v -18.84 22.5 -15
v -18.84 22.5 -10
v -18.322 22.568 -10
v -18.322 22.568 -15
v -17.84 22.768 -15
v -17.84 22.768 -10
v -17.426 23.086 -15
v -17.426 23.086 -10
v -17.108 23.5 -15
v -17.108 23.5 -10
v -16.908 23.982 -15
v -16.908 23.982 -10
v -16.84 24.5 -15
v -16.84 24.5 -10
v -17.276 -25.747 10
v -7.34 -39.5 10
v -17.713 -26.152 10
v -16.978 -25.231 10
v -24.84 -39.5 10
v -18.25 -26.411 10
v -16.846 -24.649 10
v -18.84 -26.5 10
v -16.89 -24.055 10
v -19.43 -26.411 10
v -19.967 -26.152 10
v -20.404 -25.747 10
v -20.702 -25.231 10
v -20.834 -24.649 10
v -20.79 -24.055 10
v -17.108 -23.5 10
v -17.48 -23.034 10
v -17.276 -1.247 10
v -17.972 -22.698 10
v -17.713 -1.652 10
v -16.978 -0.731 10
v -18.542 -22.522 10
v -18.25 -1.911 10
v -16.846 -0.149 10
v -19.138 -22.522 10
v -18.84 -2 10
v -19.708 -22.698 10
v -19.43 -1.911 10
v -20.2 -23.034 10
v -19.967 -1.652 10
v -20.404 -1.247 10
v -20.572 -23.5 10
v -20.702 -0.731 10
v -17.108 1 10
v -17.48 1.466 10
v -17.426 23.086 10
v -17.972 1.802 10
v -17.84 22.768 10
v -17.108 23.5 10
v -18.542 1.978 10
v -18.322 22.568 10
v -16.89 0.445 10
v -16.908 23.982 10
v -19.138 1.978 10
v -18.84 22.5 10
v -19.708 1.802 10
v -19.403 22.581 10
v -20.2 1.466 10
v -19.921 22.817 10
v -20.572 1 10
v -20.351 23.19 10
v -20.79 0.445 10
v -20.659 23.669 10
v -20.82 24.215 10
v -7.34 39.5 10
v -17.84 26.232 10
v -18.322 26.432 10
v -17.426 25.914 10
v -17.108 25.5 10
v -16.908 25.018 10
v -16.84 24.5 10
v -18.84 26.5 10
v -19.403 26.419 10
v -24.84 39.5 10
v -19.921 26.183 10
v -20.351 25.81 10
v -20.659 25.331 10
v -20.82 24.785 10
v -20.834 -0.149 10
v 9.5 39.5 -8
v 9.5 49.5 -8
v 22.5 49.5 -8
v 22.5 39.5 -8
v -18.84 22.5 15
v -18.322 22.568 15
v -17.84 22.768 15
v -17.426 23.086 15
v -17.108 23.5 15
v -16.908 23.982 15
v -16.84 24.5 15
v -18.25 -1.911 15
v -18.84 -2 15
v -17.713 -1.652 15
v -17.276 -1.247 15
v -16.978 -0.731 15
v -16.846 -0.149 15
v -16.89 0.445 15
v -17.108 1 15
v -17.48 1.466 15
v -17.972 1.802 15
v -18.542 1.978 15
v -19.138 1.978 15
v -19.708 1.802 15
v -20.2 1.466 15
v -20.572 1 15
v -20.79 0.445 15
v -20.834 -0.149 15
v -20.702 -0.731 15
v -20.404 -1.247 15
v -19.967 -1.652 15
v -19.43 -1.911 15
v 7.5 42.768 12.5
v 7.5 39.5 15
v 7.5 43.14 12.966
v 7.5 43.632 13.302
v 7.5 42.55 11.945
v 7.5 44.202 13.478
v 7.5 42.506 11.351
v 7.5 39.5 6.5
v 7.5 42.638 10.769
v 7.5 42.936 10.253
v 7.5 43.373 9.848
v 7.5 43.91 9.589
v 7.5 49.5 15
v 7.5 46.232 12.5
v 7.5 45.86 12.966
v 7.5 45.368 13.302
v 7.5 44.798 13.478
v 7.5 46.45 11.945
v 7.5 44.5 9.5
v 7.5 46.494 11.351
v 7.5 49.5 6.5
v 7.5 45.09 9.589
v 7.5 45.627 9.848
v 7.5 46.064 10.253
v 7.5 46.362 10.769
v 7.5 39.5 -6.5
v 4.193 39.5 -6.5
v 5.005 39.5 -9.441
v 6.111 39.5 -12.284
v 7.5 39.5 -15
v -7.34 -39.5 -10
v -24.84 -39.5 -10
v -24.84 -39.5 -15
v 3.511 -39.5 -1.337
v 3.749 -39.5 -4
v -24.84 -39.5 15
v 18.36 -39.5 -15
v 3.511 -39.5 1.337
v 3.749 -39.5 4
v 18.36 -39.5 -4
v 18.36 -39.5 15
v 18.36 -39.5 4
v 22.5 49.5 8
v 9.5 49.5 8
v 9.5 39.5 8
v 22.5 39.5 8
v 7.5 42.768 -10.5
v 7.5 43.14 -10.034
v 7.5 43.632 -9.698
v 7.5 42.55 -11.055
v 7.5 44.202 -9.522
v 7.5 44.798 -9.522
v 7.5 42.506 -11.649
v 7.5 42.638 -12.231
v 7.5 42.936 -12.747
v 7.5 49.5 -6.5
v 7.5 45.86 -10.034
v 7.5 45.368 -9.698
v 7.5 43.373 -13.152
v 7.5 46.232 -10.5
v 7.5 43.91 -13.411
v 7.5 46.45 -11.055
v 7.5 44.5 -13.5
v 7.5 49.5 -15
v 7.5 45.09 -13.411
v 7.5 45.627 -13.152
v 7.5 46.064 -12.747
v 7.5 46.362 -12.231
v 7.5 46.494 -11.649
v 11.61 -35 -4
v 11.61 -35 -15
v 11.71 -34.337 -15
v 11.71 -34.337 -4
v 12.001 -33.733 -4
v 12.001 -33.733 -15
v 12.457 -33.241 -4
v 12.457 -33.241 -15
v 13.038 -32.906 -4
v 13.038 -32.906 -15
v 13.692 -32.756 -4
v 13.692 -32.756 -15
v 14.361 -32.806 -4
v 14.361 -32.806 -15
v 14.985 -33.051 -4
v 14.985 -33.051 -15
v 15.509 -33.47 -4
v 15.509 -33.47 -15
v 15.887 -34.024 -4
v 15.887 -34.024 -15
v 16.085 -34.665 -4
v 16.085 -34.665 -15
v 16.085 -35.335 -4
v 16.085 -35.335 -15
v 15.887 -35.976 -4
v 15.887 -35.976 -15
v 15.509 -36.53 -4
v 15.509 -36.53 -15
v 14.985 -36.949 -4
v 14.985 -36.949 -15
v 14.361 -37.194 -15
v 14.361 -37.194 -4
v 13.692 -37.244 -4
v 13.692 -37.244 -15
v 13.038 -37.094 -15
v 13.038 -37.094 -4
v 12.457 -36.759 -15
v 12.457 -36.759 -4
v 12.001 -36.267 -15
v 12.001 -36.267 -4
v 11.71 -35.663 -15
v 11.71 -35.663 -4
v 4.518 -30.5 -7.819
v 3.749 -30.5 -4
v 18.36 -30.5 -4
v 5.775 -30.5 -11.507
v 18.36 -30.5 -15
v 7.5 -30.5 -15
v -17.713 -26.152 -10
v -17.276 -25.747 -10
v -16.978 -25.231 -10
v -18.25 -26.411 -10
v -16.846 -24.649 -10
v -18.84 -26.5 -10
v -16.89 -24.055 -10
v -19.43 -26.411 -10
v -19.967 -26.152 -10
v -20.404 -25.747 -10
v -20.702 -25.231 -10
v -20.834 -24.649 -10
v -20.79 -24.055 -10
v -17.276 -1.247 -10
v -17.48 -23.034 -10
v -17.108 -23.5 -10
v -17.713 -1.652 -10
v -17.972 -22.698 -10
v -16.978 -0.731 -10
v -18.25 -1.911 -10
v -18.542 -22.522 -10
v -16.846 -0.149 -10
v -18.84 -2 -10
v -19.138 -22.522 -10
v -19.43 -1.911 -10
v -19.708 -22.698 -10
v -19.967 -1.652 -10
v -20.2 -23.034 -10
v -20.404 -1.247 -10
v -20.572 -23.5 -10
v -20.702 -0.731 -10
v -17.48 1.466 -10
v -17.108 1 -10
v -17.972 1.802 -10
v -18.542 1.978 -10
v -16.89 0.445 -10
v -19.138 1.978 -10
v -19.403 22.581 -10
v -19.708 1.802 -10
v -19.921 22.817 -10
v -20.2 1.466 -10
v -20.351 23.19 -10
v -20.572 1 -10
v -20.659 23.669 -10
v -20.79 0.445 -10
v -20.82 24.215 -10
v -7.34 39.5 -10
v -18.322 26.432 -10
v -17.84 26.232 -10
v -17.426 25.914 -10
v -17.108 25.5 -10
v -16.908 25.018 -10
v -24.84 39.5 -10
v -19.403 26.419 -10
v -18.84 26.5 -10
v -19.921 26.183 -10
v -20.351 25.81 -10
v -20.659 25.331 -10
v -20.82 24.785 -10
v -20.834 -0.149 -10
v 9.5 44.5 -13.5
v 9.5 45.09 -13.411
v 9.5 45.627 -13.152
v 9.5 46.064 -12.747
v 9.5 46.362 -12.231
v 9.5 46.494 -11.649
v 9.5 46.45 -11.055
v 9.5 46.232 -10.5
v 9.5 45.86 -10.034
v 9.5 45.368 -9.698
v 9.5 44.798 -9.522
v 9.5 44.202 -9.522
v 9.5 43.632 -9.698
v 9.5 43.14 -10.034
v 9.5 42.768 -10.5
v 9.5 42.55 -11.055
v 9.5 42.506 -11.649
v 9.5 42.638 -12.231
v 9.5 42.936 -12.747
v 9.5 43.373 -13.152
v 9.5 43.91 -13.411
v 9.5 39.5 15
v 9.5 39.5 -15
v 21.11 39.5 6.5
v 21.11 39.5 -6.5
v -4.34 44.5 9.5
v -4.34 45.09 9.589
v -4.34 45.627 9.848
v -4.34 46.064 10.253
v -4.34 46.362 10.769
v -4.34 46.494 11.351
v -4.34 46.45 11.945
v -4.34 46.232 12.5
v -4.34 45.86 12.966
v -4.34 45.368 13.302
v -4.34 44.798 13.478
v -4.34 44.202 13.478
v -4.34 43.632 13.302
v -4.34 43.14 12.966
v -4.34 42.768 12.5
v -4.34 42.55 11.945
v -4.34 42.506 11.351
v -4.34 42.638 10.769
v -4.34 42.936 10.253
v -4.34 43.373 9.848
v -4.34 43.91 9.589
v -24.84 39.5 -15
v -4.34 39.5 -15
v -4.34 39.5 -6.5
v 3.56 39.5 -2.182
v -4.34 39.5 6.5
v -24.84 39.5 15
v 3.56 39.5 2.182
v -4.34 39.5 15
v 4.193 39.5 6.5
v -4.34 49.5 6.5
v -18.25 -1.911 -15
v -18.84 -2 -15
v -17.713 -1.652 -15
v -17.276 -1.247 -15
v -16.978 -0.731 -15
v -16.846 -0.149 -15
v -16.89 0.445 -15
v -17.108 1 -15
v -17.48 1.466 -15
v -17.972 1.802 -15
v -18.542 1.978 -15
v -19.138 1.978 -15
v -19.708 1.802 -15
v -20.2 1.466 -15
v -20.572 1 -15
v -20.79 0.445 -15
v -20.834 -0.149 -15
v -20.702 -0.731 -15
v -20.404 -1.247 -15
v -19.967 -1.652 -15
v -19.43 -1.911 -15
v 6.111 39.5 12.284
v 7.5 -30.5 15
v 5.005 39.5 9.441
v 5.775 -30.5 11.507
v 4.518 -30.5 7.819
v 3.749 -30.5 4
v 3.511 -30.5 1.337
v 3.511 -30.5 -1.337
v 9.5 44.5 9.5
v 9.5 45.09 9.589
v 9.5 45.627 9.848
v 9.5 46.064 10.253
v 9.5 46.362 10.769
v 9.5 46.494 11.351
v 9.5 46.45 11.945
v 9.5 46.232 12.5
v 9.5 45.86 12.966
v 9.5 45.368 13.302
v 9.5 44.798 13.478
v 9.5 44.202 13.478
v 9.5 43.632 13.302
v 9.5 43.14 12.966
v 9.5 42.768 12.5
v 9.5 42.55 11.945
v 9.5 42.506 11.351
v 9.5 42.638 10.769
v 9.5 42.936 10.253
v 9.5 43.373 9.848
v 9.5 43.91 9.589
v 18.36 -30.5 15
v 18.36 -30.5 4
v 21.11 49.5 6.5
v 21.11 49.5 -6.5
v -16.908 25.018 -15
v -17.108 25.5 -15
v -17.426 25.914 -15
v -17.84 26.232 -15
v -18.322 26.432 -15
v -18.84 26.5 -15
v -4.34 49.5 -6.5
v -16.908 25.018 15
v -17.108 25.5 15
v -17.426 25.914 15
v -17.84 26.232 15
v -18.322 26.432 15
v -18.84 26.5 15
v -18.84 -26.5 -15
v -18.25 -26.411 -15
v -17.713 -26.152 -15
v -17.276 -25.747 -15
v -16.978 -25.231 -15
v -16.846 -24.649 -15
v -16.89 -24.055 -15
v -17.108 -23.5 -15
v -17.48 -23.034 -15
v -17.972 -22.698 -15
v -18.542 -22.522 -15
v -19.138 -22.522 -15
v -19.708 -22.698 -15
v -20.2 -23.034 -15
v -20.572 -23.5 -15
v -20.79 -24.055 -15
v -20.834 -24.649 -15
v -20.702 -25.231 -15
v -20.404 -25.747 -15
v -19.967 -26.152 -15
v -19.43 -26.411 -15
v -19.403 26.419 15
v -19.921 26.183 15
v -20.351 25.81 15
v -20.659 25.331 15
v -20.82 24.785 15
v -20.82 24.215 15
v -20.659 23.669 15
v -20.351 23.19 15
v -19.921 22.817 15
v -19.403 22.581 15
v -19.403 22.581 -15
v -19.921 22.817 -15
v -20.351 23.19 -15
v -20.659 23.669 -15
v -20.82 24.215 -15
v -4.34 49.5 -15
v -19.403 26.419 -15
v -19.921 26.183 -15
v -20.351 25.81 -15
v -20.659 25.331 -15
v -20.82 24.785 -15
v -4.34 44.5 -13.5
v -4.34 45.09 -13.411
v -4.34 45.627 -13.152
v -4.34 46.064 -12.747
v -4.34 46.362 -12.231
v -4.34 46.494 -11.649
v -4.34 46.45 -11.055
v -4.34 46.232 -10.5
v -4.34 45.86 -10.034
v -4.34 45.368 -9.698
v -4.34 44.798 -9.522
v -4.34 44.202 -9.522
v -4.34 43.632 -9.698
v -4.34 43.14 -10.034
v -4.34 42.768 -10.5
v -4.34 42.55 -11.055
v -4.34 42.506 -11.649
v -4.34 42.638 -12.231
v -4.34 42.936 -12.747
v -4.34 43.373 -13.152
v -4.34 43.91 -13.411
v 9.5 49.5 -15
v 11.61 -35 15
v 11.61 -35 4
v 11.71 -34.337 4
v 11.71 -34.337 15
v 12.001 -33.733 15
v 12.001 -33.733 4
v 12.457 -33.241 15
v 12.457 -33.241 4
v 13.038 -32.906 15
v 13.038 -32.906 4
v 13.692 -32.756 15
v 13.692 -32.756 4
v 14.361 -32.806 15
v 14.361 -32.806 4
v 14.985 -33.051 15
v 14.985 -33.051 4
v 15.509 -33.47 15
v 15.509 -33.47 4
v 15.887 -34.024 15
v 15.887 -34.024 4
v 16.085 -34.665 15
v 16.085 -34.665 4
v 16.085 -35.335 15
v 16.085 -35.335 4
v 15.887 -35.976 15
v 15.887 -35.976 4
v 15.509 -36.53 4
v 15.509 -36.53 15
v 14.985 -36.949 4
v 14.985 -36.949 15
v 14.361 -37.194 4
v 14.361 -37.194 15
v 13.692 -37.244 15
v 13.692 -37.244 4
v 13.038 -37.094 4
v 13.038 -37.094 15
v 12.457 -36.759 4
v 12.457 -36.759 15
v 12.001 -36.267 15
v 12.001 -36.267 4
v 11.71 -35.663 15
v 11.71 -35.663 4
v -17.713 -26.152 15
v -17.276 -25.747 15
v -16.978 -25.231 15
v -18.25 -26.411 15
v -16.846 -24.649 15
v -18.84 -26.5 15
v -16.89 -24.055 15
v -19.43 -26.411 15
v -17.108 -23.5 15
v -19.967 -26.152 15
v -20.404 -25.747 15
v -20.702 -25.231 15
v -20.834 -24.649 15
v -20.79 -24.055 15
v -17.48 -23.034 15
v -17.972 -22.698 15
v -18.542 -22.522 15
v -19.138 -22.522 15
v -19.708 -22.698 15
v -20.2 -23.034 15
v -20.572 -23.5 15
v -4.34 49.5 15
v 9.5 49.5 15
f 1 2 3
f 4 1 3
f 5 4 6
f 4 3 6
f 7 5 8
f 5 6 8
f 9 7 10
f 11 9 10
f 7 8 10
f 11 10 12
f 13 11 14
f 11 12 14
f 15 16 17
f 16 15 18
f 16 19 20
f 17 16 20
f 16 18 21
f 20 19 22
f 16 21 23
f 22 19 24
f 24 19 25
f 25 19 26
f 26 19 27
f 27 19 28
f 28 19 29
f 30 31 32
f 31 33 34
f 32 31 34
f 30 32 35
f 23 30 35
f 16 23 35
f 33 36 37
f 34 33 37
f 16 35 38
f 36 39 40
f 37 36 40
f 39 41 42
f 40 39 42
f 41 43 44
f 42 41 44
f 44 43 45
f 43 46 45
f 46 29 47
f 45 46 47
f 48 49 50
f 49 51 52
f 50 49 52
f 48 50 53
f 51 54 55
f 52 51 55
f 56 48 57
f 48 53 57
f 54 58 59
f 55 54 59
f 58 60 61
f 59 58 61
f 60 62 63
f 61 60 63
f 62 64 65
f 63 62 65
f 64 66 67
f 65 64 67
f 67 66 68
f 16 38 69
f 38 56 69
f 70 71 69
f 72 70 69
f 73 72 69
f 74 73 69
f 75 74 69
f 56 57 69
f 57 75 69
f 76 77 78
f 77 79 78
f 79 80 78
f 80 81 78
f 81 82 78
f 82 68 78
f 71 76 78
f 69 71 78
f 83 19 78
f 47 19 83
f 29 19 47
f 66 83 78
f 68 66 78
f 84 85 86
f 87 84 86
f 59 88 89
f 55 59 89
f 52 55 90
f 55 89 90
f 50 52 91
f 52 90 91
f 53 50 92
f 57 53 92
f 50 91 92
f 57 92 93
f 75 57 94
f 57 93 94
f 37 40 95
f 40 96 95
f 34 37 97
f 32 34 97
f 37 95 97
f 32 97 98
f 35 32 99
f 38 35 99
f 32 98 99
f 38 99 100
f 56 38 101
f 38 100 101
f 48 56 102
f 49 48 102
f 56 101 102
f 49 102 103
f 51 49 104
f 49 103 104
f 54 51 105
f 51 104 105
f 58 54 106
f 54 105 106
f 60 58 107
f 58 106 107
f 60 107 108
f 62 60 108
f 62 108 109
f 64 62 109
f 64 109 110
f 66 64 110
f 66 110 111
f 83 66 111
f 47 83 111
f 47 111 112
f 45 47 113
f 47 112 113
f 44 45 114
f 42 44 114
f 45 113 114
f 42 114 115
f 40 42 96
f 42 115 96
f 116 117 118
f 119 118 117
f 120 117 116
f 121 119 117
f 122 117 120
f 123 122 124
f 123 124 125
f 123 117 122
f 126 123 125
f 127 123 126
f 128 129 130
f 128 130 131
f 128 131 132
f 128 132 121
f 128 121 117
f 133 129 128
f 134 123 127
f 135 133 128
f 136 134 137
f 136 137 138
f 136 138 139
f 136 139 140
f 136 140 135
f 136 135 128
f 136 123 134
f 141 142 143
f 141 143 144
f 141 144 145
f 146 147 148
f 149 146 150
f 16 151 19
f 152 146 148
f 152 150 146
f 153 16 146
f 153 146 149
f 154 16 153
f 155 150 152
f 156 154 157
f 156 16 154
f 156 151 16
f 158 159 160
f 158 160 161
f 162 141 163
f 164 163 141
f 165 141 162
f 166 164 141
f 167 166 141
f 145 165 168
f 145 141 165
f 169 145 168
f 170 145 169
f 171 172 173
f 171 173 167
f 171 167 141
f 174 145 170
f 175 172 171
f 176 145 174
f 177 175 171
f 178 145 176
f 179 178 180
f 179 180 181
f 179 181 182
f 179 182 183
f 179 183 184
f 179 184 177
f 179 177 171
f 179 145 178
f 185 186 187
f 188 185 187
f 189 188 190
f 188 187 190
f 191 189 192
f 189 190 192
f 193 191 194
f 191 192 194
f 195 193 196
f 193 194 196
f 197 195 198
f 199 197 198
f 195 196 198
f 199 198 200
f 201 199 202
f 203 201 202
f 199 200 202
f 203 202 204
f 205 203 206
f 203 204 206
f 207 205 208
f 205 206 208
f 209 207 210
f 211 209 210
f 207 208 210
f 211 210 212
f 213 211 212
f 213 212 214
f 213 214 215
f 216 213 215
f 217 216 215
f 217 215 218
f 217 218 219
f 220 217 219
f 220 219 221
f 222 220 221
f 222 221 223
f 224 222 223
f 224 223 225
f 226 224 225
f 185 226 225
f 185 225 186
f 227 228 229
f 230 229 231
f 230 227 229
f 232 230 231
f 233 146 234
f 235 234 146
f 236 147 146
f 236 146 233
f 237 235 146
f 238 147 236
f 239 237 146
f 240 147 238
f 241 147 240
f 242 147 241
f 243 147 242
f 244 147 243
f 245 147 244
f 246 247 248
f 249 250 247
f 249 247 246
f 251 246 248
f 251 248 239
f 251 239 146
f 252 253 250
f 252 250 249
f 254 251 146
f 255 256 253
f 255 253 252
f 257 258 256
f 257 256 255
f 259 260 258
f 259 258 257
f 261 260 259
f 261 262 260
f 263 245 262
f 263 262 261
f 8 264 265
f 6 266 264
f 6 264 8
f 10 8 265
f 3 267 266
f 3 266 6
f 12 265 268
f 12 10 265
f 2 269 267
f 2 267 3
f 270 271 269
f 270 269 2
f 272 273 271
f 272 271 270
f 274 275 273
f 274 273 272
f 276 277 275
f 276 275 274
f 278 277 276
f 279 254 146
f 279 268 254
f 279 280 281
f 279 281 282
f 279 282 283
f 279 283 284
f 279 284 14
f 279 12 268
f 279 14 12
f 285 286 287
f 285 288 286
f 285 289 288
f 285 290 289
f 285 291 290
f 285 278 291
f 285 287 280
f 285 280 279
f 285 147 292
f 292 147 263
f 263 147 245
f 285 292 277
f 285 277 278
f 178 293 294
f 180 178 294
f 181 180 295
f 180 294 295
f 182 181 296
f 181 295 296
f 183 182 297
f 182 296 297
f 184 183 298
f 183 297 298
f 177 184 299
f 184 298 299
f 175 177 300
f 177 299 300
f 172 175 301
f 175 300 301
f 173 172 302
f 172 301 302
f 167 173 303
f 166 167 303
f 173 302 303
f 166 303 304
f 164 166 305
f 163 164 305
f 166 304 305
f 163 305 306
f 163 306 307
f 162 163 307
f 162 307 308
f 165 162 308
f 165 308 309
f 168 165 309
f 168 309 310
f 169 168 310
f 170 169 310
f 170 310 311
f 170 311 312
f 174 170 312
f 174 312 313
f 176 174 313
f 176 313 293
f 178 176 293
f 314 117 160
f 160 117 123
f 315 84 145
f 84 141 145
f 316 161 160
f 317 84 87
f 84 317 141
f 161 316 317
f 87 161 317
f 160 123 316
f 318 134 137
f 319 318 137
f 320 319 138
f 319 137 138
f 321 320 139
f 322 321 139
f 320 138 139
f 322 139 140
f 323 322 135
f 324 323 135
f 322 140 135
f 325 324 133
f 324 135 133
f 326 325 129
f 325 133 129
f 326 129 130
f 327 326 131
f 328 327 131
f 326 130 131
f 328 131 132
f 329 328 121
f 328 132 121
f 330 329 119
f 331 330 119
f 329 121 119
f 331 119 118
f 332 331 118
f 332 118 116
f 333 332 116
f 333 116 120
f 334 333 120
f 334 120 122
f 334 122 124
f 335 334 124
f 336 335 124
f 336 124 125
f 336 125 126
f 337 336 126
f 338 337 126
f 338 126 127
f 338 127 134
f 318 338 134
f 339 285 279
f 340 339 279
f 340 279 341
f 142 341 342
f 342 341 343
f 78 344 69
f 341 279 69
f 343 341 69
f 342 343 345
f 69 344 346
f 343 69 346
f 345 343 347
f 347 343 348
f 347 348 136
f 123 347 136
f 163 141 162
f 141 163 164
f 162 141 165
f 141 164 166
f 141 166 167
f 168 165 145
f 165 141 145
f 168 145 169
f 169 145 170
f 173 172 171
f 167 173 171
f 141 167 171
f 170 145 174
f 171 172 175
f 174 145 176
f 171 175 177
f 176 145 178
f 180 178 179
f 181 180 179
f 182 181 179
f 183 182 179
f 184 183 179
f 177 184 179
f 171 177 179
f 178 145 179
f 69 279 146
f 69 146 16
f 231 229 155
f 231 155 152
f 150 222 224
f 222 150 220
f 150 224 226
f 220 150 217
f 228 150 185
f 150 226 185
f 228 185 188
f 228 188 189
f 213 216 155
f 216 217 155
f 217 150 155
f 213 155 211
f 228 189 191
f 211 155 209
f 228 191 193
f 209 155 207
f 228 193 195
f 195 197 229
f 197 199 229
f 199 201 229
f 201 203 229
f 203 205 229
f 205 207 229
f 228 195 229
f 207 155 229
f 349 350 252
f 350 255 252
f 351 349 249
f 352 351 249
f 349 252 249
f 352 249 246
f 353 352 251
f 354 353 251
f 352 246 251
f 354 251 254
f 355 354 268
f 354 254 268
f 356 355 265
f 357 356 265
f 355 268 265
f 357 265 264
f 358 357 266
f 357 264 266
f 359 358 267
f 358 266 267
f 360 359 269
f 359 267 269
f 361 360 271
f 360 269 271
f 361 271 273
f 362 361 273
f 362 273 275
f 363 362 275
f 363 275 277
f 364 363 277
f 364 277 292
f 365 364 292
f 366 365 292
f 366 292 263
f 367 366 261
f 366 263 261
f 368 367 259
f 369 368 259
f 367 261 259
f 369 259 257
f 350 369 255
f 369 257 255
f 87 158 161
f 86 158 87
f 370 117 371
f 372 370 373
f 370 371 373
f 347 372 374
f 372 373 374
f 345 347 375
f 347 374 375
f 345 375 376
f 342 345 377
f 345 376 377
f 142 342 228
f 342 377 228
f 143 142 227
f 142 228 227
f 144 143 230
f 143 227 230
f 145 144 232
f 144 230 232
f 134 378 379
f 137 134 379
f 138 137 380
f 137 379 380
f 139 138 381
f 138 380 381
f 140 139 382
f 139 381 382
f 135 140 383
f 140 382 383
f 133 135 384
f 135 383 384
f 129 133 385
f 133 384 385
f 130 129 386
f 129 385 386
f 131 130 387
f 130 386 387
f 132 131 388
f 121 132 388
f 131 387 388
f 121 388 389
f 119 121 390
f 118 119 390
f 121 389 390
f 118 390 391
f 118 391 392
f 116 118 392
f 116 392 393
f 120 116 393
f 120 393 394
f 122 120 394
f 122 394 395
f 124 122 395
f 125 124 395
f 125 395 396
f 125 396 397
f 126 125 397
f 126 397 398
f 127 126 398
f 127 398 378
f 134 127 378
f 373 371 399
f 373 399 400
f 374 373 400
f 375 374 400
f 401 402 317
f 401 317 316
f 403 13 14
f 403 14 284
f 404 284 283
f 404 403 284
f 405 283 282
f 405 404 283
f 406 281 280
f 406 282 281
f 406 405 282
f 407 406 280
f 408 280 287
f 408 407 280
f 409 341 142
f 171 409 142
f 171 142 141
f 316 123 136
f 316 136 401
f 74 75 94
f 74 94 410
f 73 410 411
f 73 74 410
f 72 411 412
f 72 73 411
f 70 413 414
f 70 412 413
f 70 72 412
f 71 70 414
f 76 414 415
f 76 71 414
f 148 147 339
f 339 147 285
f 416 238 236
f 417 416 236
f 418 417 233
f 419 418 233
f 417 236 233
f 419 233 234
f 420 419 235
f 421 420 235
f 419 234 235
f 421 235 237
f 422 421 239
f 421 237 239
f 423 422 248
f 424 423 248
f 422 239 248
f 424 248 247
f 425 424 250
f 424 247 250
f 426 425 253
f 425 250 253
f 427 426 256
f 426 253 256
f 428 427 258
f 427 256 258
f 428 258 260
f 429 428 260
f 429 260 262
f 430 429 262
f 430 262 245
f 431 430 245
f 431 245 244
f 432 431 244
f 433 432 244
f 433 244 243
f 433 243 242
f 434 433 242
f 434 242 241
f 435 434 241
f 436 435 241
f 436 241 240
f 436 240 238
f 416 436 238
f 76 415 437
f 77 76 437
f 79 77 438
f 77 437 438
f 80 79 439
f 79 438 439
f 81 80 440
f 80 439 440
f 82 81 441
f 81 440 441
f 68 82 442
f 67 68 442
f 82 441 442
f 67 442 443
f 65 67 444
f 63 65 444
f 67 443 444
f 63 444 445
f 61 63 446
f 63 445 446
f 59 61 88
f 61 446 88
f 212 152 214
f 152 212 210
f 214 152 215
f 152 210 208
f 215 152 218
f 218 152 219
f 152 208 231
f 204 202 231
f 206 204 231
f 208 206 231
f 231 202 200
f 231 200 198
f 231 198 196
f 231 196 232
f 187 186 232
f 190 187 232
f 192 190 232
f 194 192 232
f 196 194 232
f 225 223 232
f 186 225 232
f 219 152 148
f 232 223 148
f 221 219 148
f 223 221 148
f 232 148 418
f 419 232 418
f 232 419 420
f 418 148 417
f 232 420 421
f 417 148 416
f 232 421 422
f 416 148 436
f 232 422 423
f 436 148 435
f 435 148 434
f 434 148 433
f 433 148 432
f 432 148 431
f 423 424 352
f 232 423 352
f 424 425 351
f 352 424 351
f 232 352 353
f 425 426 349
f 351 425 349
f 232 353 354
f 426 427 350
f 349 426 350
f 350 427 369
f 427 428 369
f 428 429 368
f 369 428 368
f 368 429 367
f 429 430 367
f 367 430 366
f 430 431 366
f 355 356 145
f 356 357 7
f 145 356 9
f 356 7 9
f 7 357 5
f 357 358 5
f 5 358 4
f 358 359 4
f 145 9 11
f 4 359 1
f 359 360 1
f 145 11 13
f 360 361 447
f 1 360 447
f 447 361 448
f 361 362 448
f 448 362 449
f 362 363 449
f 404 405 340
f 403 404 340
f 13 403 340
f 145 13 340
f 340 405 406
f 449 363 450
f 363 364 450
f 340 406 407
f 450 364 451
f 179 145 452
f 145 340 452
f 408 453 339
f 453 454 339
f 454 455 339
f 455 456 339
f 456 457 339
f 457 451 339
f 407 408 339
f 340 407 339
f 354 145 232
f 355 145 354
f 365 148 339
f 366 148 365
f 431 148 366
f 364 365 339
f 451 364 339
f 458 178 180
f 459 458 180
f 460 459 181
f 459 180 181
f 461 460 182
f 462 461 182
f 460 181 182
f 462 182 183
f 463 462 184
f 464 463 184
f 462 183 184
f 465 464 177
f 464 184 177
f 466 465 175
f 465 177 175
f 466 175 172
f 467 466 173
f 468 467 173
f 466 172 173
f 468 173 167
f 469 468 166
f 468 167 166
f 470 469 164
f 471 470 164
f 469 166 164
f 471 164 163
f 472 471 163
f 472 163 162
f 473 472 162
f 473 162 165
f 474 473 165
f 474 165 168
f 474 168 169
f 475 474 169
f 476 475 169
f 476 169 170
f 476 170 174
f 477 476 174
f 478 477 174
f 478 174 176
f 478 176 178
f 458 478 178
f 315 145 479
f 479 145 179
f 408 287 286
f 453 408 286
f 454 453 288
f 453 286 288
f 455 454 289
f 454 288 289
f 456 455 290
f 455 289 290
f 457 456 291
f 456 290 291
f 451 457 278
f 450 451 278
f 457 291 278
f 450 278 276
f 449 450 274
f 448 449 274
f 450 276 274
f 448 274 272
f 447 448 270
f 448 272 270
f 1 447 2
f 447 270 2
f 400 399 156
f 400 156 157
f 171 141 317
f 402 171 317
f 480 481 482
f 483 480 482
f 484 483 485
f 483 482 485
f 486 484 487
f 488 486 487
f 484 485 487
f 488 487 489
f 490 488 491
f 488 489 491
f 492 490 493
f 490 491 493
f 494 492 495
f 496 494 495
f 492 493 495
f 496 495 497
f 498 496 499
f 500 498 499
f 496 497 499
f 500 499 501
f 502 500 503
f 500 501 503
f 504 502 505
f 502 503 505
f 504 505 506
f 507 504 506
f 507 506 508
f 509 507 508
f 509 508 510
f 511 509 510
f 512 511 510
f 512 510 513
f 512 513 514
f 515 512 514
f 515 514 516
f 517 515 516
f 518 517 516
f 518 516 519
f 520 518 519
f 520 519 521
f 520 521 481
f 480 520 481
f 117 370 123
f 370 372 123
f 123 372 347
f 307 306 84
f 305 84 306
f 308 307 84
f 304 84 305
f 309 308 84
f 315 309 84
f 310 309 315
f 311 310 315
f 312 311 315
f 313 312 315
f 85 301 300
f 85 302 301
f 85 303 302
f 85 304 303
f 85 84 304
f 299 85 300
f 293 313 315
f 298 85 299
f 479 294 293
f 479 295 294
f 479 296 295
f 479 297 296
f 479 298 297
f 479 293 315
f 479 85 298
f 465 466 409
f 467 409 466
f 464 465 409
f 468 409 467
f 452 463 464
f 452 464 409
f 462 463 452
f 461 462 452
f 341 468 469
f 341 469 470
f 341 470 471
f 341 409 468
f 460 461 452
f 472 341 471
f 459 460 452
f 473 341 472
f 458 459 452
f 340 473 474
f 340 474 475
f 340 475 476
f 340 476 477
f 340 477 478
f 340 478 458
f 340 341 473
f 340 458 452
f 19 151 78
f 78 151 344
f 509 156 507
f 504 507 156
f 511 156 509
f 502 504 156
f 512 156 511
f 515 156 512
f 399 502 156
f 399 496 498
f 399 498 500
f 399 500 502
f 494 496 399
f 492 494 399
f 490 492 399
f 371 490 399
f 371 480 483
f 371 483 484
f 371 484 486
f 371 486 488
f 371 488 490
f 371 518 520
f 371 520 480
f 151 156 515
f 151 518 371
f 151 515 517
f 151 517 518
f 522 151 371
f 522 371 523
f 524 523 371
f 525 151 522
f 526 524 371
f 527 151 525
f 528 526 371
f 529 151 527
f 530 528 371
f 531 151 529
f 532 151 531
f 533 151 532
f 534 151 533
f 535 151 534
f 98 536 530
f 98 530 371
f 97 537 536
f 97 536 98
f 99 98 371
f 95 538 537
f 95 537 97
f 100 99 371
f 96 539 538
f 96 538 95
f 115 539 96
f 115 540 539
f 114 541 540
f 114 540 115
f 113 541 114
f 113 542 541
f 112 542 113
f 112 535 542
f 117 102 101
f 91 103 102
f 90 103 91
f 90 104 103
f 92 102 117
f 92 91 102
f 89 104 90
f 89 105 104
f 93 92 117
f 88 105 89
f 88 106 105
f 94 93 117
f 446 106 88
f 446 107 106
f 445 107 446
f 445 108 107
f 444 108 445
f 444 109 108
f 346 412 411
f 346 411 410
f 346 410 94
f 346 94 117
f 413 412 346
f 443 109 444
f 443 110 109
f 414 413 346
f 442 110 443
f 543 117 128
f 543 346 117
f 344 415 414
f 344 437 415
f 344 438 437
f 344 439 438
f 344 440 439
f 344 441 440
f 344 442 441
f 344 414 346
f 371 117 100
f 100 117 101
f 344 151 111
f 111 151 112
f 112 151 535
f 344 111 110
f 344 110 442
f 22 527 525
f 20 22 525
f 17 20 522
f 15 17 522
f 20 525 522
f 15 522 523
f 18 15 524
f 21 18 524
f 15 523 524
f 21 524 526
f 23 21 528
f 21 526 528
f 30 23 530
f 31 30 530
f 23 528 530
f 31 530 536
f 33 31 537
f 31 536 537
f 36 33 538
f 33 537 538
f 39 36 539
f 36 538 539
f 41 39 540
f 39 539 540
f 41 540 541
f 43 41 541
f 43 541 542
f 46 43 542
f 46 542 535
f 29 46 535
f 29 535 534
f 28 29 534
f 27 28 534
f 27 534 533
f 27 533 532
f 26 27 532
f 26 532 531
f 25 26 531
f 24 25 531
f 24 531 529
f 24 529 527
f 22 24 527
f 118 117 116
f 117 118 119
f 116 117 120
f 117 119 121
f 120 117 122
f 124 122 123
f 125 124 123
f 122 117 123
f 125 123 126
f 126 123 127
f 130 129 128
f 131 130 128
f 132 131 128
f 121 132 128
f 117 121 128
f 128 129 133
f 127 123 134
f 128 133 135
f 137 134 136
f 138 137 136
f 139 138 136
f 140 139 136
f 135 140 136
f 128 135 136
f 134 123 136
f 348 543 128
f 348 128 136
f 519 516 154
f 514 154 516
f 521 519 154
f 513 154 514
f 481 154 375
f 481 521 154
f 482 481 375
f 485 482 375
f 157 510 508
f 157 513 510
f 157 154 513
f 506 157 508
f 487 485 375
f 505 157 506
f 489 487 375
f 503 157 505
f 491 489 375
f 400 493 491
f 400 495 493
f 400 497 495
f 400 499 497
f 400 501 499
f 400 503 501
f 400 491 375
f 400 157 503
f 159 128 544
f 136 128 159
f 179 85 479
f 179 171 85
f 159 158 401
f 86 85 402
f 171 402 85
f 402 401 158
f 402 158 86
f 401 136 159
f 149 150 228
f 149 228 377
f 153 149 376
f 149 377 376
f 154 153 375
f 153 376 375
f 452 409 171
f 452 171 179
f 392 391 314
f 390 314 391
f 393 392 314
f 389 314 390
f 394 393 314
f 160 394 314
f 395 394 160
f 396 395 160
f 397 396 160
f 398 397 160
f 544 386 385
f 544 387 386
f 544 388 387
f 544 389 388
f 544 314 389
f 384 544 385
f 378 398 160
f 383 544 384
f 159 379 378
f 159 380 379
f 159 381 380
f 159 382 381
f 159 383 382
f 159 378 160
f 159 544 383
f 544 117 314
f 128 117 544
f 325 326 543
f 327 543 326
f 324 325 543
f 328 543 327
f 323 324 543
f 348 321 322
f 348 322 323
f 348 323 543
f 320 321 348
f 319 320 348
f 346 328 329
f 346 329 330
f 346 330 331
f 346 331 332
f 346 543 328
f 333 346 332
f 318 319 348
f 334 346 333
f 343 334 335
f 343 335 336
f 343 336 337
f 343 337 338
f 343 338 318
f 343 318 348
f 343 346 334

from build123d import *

# Parameters (mm, degrees)
SKETCH1_W               = 15
SKETCH1_H               = 79
BOSS_EXTRUDE1_DEPTH     = 15
CUT_EXTRUDE1_DEPTH      = 81.76044824
CUT_EXTRUDE1_DEPTH_BACK = 70
SKETCH3_W               = 30
SKETCH3_H               = 9
BOSS_EXTRUDE2_DEPTH     = 10.86
SKETCH4_R               = 2.25
CUT_EXTRUDE2_DEPTH      = 50.86
CUT_EXTRUDE3_REACH      = 51.538
CUT_EXTRUDE3_END_RADIUS = 30
SKETCH5_W               = 8
SKETCH5_H               = 9
SKETCH8_W               = 17.34
SKETCH8_H               = 79
BOSS_EXTRUDE3_DEPTH     = 15
SKETCH9_W               = 20
SKETCH9_H               = 79
CUT_EXTRUDE4_DEPTH      = 17.5
SKETCH10_R              = 2
CUT_EXTRUDE5_DEPTH      = 40
SKETCH11_W              = 11.84
SKETCH11_H              = 8.5
BOSS_EXTRUDE4_DEPTH     = 10
SKETCH12_R              = 1.5
CUT_EXTRUDE6_DEPTH      = 15
SKETCH14_W              = 30
SKETCH14_H              = 10
BOSS_EXTRUDE5_DEPTH     = 15
SKETCH15_W              = 13
SKETCH15_H              = 7
CUT_EXTRUDE7_DEPTH      = 13
SPLIT1_SURFACE_1_BACK   = 106.176
SPLIT1_SURFACE_1_DEPTH  = 212.352
SPLIT1_SURFACE_2_BACK   = 106.176
SPLIT1_SURFACE_2_DEPTH  = 212.352
SKETCH18_R              = 2
CUT_EXTRUDE8_DEPTH      = 43


with BuildPart() as part:
    # Sketch1 → Boss-Extrude1 (new, symmetric)
    with BuildSketch(Plane.XY):
        Rectangle(SKETCH1_W, SKETCH1_H)
    extrude(amount=BOSS_EXTRUDE1_DEPTH, both=True)

    # Sketch2 → Cut-Extrude1 (cut, two sides: drawn at the far end of the back side and taken through both)
    with BuildSketch(Plane(origin=(0, 39.5, 0), x_dir=(1, 0, 0), z_dir=(0, 1, 0)).offset(-CUT_EXTRUDE1_DEPTH_BACK)):
        with BuildLine():
            ThreePointArc((7.5, -15), (3.480762114, 0), (7.5, 15))
            Line((7.5, 15), (7.5, -15))
        make_face()
    extrude(amount=CUT_EXTRUDE1_DEPTH + CUT_EXTRUDE1_DEPTH_BACK, mode=Mode.SUBTRACT)

    # Sketch3 → Boss-Extrude2 (add)
    with BuildSketch(Plane(origin=(7.5, 0, 0), x_dir=(0, 0, -1), z_dir=(1, 0, 0))):
        with Locations((0, -35)):
            Rectangle(SKETCH3_W, SKETCH3_H)
    extrude(amount=BOSS_EXTRUDE2_DEPTH)

    # Sketch4 → Cut-Extrude2 (cut)
    with BuildSketch(Plane(origin=(0, 0, -15), x_dir=(-1, 0, 0), z_dir=(0, 0, -1))):
        with Locations((-13.86, -35)):
            Circle(SKETCH4_R)
    extrude(amount=-CUT_EXTRUDE2_DEPTH, mode=Mode.SUBTRACT)

    # Cut-Extrude3: up to this cylinder (the profile starts inside it)
    cut_extrude3_end = Plane(origin=(33.480762114, -35, 0), z_dir=(0, 1, 0)) * Cylinder(CUT_EXTRUDE3_END_RADIUS, 164.076, mode=Mode.PRIVATE)
    # Sketch5 → Cut-Extrude3 (cut, up to the surface)
    with BuildSketch(Plane(origin=(18.36, 0, 0), x_dir=(0, 0, -1), z_dir=(1, 0, 0)), mode=Mode.PRIVATE) as cut_extrude3_sk1:
        with Locations((0, -35)):
            Rectangle(SKETCH5_W, SKETCH5_H)
    cut_extrude3_tool1 = extrude(cut_extrude3_sk1.sketch, amount=-CUT_EXTRUDE3_REACH, mode=Mode.PRIVATE) & cut_extrude3_end
    add(cut_extrude3_tool1.solids().sort_by_distance((18.36, -35, 0))[0], mode=Mode.SUBTRACT)

    # Sketch8 → Boss-Extrude3 (add, symmetric)
    with BuildSketch(Plane.XY):
        with Locations((-16.17, 0)):
            Rectangle(SKETCH8_W, SKETCH8_H)
    extrude(amount=BOSS_EXTRUDE3_DEPTH, both=True)

    # Sketch9 → Cut-Extrude4 (cut, symmetric)
    with BuildSketch(Plane.ZY.offset(24.84)):
        Rectangle(SKETCH9_W, SKETCH9_H)
    extrude(amount=CUT_EXTRUDE4_DEPTH, both=True, mode=Mode.SUBTRACT)

    # Sketch10 → Cut-Extrude5 (cut, symmetric)
    with BuildSketch(Plane.XY.offset(15)):
        with BuildLine():
            ThreePointArc((-16.84, 24.5), (-17.425786438, 25.914213562), (-18.84, 26.5))
            Line((-18.84, 26.5), (-18.84, 22.5))
            ThreePointArc((-18.84, 22.5), (-17.425786438, 23.085786438), (-16.84, 24.5))
        make_face()
        with BuildLine():
            Line((-18.84, 22.5), (-18.84, 26.5))
            ThreePointArc((-18.84, 26.5), (-20.84, 24.5), (-18.84, 22.5))
        make_face()
        with Locations(Location((-18.84, -24.5, 0), (0, 0, 270))):
            Circle(SKETCH10_R)
        with Locations(Location((-18.84, 0, 0), (0, 0, 270))):
            Circle(SKETCH10_R)
    extrude(amount=CUT_EXTRUDE5_DEPTH, both=True, mode=Mode.SUBTRACT)

    # Sketch11 → Boss-Extrude4 (add)
    with BuildSketch(Plane(origin=(0, 39.5, 0), x_dir=(1, 0, 0), z_dir=(0, 1, 0))):
        with Locations((1.58, -10.75)):
            Rectangle(SKETCH11_W, SKETCH11_H)
        with Locations((1.58, 10.75)):
            Rectangle(SKETCH11_W, SKETCH11_H)
    extrude(amount=BOSS_EXTRUDE4_DEPTH)

    # Sketch12 → Cut-Extrude6 (cut, symmetric)
    with BuildSketch(Plane(origin=(7.5, 0, 0), x_dir=(0, 0, -1), z_dir=(1, 0, 0))):
        with Locations((11.25, 44.5)):
            Circle(SKETCH12_R)
        with Locations((-11.25, 44.5)):
            Circle(SKETCH12_R)
    extrude(amount=CUT_EXTRUDE6_DEPTH, both=True, mode=Mode.SUBTRACT)

    # Sketch14 → Boss-Extrude5 (add)
    with BuildSketch(Plane(origin=(7.5, 0, 0), x_dir=(0, 0, -1), z_dir=(1, 0, 0))):
        with Locations((0, 44.5)):
            Rectangle(SKETCH14_W, SKETCH14_H)
    extrude(amount=BOSS_EXTRUDE5_DEPTH)

    # Sketch15 → Cut-Extrude7 (cut)
    with BuildSketch(Plane(origin=(0, 49.5, 0), x_dir=(1, 0, 0), z_dir=(0, 1, 0))):
        with Locations((16, -11.5)):
            Rectangle(SKETCH15_W, SKETCH15_H)
        with Locations((16, 11.5)):
            Rectangle(SKETCH15_W, SKETCH15_H)
        Polygon((8.75, -6.5), (7.5, -6.5), (7.5, 6.5), (8.75, 6.5), (21.11, 6.5), (21.11, -6.5), align=None)
    extrude(amount=-CUT_EXTRUDE7_DEPTH, mode=Mode.SUBTRACT)


with BuildPart() as body_2:
    # Split1: the piece behind the surface
    add(part.part)
    # Split1 surface: a surface, the sketch's curves swept straight by 212.352 mm
    with BuildLine(Plane.XY.offset(15).offset(-SPLIT1_SURFACE_1_BACK), mode=Mode.PRIVATE) as split1_surface_1_path:
        Line((7.5, 39.5), (7.5, 49.5))
    split1_surface_1 = Shell.extrude(split1_surface_1_path.wire(), (0 * SPLIT1_SURFACE_1_DEPTH, 0 * SPLIT1_SURFACE_1_DEPTH, 1 * SPLIT1_SURFACE_1_DEPTH))
    split(bisect_by=split1_surface_1, keep=Keep.BOTTOM)


with BuildPart() as part_1:
    add(part.part)

    # Split1: split by a surface, the side it looks to stays
    # Split1 surface: a surface, the sketch's curves swept straight by 212.352 mm
    with BuildLine(Plane.XY.offset(15).offset(-SPLIT1_SURFACE_2_BACK), mode=Mode.PRIVATE) as split1_surface_2_path:
        Line((7.5, 39.5), (7.5, 49.5))
    split1_surface_2 = Shell.extrude(split1_surface_2_path.wire(), (0 * SPLIT1_SURFACE_2_DEPTH, 0 * SPLIT1_SURFACE_2_DEPTH, 1 * SPLIT1_SURFACE_2_DEPTH))
    split(bisect_by=split1_surface_2, keep=Keep.TOP)


with BuildPart() as cut_extrude8_tool:
    # Sketch18 → Cut-Extrude8 (new body)
    with BuildSketch(Plane(origin=(22.5, 0, 0), x_dir=(0, 0, -1), z_dir=(1, 0, 0))):
        with Locations((-11.5, 44.5)):
            Circle(SKETCH18_R)
        with Locations((11.5, 44.5)):
            Circle(SKETCH18_R)
    extrude(amount=-CUT_EXTRUDE8_DEPTH)


with BuildPart() as part_2:
    add(part_1.part)

    # Cut-Extrude8: cut by cut_extrude8_tool
    add(cut_extrude8_tool.part, mode=Mode.SUBTRACT)


with BuildPart() as body_2_1:
    add(body_2.part)

    # Cut-Extrude8: cut by cut_extrude8_tool
    add(cut_extrude8_tool.part, mode=Mode.SUBTRACT)


solid = Compound([part_2.part, body_2_1.part])
